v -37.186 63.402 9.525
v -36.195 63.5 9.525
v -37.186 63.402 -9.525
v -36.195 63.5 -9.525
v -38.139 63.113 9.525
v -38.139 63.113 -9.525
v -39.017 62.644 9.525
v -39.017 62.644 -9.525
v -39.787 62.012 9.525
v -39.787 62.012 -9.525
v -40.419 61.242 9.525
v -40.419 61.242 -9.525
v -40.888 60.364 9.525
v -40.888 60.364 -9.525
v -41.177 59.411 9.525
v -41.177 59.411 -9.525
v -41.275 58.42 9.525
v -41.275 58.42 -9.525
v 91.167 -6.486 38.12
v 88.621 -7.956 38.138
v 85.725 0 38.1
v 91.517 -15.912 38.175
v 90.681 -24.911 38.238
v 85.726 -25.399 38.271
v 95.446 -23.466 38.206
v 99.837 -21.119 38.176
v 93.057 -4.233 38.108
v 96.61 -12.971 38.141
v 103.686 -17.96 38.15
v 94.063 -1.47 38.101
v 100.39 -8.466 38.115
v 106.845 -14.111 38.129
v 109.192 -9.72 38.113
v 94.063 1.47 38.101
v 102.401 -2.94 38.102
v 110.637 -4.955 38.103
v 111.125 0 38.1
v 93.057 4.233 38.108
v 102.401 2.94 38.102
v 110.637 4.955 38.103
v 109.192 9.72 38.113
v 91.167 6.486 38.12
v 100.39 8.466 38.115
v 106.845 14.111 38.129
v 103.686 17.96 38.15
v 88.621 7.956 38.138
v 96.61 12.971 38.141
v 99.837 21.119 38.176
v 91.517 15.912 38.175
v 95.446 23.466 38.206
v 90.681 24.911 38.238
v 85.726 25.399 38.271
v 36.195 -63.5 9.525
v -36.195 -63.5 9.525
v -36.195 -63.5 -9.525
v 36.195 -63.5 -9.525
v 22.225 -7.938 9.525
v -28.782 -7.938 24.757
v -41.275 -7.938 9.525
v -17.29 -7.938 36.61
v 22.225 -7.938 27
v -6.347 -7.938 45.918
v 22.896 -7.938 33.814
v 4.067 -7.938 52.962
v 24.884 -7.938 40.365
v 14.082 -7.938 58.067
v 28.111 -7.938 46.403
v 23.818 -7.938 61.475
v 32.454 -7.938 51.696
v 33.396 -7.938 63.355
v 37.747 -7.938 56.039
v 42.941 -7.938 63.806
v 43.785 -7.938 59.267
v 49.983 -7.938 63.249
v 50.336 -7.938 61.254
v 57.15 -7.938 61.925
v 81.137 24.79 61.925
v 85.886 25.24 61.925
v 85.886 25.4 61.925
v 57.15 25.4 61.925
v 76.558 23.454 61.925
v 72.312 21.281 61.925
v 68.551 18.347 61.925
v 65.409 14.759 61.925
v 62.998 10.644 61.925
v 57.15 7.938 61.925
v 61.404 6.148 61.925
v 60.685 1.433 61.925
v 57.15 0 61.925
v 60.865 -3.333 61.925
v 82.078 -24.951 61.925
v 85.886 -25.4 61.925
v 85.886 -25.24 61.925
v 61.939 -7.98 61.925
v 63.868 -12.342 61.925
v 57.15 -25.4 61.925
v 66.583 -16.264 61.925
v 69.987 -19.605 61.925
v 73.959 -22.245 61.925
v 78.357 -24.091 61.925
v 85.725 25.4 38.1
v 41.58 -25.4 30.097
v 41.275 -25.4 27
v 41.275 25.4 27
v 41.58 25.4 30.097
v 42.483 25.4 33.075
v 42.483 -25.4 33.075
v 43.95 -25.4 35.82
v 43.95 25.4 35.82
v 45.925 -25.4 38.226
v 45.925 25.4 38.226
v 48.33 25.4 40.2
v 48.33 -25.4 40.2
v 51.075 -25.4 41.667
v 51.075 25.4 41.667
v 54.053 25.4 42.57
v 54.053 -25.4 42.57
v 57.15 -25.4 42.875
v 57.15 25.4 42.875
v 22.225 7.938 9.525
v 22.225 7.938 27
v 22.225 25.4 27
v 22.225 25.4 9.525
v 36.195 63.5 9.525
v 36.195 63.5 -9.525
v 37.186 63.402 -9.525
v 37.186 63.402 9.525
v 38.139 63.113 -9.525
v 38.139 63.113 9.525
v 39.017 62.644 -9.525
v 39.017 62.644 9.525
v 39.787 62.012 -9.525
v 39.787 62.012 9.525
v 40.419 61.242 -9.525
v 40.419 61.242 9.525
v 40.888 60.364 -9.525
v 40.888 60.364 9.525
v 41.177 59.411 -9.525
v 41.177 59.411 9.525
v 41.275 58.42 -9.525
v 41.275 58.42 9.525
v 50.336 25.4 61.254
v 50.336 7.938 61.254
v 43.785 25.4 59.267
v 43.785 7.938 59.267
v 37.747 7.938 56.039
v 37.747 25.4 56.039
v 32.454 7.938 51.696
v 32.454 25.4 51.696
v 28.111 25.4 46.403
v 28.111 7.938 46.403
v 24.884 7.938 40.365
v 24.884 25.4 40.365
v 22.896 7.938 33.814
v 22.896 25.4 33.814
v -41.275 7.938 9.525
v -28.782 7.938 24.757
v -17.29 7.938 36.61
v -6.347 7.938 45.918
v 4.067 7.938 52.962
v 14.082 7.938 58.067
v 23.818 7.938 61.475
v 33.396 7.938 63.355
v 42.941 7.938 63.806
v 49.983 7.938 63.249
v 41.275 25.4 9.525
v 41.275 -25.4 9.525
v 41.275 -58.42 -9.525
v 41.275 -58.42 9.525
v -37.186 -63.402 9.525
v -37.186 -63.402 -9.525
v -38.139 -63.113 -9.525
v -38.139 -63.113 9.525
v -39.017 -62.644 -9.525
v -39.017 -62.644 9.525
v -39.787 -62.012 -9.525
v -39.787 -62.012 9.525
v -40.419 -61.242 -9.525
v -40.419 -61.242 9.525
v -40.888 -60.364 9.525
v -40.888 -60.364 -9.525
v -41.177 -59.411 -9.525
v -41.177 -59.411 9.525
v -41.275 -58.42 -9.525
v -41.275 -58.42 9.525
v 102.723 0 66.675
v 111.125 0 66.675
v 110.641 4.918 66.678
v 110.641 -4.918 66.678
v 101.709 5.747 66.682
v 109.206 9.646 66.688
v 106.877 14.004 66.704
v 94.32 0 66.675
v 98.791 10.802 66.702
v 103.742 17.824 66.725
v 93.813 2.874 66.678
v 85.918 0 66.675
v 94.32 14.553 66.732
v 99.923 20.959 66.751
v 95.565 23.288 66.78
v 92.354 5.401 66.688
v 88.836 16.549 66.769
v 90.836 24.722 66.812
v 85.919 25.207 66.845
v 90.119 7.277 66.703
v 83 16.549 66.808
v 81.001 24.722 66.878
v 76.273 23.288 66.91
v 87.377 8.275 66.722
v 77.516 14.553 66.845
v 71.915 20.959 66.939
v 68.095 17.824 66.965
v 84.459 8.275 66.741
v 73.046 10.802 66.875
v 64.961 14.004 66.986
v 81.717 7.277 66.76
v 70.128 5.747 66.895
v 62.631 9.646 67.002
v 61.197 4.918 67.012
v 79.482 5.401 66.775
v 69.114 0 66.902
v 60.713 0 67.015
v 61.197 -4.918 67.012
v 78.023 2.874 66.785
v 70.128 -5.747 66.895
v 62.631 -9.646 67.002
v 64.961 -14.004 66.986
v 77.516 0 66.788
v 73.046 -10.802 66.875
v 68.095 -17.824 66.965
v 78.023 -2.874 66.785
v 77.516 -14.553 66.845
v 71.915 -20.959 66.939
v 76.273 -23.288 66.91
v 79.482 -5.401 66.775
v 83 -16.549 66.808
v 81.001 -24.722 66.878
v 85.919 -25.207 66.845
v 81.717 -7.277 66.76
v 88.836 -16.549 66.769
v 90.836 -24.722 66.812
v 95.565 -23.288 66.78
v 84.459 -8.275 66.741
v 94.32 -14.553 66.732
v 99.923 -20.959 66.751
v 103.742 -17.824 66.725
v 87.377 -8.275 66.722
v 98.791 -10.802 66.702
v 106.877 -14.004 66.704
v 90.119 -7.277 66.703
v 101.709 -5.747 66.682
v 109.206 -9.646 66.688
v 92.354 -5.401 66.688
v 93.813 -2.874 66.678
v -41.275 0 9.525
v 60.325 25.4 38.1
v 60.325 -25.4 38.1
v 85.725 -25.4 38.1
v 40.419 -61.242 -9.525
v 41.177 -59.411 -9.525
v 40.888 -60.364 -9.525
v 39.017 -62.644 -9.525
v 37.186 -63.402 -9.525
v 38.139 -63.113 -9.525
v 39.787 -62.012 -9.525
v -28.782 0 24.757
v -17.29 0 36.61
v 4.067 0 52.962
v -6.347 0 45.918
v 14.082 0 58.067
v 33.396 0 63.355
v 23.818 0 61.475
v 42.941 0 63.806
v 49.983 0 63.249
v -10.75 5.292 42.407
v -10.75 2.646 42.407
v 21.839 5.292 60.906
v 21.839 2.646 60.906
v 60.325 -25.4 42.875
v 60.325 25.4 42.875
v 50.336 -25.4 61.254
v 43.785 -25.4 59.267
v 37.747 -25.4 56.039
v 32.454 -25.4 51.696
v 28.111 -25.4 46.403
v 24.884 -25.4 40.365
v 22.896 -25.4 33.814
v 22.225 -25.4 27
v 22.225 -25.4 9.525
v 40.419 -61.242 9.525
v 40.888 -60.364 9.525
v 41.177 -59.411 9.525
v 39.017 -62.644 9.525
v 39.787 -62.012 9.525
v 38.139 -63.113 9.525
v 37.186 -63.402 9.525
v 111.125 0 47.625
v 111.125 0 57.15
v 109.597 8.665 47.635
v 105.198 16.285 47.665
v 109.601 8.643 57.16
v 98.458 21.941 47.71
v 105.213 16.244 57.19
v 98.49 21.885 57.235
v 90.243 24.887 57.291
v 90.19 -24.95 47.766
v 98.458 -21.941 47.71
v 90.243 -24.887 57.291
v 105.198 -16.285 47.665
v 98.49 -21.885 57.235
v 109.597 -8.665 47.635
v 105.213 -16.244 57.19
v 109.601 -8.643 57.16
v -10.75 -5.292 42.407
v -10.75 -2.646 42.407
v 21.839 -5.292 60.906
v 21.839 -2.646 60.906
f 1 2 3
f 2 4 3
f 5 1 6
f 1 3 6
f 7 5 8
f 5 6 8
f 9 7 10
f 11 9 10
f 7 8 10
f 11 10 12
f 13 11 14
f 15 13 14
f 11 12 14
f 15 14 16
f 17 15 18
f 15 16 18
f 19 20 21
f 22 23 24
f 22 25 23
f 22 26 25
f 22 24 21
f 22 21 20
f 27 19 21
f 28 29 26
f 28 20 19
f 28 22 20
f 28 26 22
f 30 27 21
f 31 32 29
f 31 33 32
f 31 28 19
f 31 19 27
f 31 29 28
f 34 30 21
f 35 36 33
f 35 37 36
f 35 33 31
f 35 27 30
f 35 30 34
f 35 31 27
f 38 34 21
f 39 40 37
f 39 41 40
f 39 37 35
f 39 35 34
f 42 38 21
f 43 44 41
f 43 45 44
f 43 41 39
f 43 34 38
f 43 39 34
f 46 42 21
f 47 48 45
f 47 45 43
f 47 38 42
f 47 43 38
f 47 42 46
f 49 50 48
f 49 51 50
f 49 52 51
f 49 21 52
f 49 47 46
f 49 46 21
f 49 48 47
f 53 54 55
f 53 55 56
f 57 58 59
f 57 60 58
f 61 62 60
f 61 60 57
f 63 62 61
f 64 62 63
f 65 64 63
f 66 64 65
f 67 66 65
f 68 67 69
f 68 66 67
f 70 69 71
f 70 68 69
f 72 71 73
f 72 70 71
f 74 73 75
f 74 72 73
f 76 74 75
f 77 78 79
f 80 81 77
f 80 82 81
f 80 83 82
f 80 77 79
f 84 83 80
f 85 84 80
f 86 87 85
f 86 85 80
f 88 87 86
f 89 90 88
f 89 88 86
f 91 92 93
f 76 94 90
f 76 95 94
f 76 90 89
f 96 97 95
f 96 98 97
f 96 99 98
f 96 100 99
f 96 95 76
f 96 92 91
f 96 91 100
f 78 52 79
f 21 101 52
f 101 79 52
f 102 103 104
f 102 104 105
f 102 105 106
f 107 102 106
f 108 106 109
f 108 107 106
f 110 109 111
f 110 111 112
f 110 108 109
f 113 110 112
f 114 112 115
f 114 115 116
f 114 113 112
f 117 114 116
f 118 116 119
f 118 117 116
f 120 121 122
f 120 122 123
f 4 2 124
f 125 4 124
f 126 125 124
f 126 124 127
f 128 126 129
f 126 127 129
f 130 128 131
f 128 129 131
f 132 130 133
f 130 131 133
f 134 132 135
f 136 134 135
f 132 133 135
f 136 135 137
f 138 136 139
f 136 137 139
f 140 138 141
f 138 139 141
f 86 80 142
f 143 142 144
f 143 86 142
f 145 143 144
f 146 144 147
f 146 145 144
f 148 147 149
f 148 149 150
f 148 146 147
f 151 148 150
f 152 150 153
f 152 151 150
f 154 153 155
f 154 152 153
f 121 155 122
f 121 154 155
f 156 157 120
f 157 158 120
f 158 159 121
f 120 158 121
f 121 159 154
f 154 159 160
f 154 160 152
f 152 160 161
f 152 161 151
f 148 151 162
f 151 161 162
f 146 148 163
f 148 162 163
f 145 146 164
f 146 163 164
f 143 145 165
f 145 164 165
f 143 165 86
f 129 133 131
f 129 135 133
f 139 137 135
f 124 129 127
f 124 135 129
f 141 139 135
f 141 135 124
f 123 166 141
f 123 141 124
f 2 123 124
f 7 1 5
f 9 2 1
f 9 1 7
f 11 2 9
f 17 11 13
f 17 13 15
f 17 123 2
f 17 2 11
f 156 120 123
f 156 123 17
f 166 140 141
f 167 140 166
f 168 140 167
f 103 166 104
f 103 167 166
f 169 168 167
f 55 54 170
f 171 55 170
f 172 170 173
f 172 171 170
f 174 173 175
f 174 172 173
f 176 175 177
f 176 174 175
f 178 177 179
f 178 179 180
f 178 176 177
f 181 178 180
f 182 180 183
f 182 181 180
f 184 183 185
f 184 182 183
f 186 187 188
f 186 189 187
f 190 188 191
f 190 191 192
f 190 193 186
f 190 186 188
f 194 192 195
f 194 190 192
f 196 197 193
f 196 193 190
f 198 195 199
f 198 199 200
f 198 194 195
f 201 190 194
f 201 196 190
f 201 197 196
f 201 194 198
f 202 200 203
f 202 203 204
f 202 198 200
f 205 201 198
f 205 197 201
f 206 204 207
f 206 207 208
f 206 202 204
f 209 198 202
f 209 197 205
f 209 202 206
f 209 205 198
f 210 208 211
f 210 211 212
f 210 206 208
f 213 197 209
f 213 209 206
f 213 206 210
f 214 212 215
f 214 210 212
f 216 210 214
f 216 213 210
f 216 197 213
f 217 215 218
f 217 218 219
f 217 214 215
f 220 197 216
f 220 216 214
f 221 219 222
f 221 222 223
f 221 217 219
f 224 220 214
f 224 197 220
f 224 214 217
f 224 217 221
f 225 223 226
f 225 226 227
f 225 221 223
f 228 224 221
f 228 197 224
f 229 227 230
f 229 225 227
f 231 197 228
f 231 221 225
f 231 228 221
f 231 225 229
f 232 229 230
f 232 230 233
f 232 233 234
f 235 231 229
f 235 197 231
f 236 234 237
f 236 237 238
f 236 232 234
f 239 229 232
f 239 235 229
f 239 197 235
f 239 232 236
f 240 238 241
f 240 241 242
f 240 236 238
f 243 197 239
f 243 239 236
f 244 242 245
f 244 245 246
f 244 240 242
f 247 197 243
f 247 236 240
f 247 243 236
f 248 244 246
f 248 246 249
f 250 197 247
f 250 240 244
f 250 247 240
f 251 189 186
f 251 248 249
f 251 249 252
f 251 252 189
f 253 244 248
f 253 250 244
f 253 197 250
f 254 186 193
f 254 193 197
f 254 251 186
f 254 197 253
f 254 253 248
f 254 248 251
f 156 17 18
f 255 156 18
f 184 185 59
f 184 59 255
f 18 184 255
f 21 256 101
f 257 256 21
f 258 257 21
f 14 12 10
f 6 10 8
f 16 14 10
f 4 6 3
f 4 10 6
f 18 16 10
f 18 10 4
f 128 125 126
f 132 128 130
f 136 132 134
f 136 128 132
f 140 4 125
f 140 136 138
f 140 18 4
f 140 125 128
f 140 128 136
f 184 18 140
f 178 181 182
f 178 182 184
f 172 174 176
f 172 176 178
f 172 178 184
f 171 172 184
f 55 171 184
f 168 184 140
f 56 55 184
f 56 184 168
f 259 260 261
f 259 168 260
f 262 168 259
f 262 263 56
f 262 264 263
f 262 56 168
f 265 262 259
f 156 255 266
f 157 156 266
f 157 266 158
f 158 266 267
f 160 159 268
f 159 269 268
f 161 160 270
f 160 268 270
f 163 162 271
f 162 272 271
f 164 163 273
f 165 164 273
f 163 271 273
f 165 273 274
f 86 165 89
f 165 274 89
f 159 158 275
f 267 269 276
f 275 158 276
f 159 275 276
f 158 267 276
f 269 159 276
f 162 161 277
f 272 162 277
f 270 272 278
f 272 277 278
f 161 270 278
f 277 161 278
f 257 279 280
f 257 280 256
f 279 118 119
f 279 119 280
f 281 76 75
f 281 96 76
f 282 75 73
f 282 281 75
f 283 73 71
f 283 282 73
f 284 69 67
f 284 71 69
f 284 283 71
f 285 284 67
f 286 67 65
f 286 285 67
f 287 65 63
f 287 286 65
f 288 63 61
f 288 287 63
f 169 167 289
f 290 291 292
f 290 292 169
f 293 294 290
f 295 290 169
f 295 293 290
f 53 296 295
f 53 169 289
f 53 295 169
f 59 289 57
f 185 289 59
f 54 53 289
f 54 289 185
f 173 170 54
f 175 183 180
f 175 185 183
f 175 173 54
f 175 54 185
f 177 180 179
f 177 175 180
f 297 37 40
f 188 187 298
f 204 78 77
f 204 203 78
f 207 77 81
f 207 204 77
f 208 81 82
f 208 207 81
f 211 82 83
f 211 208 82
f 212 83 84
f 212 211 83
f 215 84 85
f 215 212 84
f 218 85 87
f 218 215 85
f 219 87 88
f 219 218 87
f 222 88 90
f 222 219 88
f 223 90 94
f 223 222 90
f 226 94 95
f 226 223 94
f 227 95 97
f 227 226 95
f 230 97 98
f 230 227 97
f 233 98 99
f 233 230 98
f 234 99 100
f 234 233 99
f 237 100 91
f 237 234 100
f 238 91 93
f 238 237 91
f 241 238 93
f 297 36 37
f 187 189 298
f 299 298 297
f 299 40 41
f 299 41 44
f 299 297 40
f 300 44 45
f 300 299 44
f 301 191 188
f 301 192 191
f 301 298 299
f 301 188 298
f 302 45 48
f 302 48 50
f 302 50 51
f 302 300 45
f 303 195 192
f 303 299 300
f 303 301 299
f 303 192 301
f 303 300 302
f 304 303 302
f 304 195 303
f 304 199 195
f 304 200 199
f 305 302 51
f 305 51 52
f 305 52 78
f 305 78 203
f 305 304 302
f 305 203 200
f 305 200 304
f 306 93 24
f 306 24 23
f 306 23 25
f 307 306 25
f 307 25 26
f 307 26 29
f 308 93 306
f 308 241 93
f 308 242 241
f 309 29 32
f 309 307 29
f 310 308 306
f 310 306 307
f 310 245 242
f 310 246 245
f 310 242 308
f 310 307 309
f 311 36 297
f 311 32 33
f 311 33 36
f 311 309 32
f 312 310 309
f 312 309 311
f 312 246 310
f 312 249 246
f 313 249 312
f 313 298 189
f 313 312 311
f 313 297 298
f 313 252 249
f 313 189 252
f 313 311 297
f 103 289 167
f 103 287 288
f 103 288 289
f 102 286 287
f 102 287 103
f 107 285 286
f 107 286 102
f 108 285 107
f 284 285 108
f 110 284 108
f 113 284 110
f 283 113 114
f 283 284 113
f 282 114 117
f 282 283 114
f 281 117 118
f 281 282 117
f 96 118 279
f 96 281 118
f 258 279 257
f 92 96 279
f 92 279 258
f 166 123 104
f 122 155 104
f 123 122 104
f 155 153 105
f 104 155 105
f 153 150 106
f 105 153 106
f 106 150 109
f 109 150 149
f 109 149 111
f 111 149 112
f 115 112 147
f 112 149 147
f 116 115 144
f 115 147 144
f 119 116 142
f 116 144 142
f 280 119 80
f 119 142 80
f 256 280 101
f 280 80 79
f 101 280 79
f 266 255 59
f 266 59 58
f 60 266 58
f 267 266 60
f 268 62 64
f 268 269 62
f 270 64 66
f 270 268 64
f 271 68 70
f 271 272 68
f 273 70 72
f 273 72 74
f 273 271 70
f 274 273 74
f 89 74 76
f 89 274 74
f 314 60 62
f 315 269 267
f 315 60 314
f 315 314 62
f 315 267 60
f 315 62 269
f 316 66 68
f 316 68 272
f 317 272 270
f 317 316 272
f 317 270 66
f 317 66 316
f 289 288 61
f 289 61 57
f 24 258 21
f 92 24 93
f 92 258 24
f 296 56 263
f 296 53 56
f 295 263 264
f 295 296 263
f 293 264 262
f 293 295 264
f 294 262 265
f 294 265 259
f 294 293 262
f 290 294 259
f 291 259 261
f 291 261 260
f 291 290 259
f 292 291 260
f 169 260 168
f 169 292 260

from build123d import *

# Parameters (mm, degrees)
F1_DEPTH = 63.5
F2_DEPTH = 25.4
F3_DEPTH = 7.9375
F5_R     = 5.08


with BuildPart() as f1:
    # F0 (on Front) → F1 (new body, symmetric)
    with BuildSketch(Plane.XZ):
        Polygon((41.275, -9.525), (41.275, 9.525), (22.225, 9.525), (-41.275, 9.525), (-41.275, -9.525), align=None)
    extrude(amount=F1_DEPTH, both=True)

    # F0 (on Front) → F2 (join, symmetric)
    with BuildSketch(Plane.XZ):
        with BuildLine():
            Line((22.225, 9.525), (41.275, 9.525))
            Line((41.275, 9.525), (41.275, 27.0002))
            ThreePointArc((41.275, 27.0002), (45.9246798487, 38.2255201513), (57.15, 42.8752))
            Line((57.15, 42.8752), (60.325, 42.8752))
            Line((60.325, 42.8752), (60.325, 61.9252))
            Line((60.325, 61.9252), (57.15, 61.9252))
            ThreePointArc((57.15, 61.9252), (32.4542956671, 51.6959043329), (22.225, 27.0002))
            Line((22.225, 27.0002), (22.225, 9.525))
        make_face()
        Polygon((60.325, 61.9252), (60.325, 42.8752), (60.325, 38.1), (85.725, 38.1), (85.8855976067, 61.9252), align=None)
    extrude(amount=F2_DEPTH, both=True)

    # F0 (on Front) → F3 (join, symmetric)
    with BuildSketch(Plane.XZ):
        with BuildLine():
            Line((-41.275, 9.525), (22.225, 9.525))
            Line((22.225, 9.525), (22.225, 27.0002))
            ThreePointArc((22.225, 27.0002), (32.4542956671, 51.6959043329), (57.15, 61.9252))
            add(Edge.make_bspline(
                [(-41.275, 9.525), (-11.5636568516, 48.5677458346), (20.2601272613, 70.6769004464), (57.15, 61.9252)],
                knots=[0, 0, 0, 0, 111.5045361635, 111.5045361635, 111.5045361635, 111.5045361635], degree=3))
        make_face()
    extrude(amount=F3_DEPTH, both=True)

    # F0 (on Front) → F4 (revolve)
    with BuildSketch(Plane.XZ):
        Polygon((85.9176144004, 66.675), (85.8855976067, 61.9252), (85.725, 38.1), (111.125, 38.1), (111.125, 66.675), align=None)
    revolve(axis=Axis((85.8213072002, 0, 52.3875), (0.0067405083, 0, 0.9999772825)))

    # F5
    f5_edges = [f1.edges().sort_by_distance(p)[0] for p in [
        (41.275, -63.5, 0),
        (-41.275, -63.5, 0),
        (41.275, 63.5, 0),
        (-41.275, 63.5, 0),
    ]]
    fillet(f5_edges, radius=F5_R)


solid = f1.part
